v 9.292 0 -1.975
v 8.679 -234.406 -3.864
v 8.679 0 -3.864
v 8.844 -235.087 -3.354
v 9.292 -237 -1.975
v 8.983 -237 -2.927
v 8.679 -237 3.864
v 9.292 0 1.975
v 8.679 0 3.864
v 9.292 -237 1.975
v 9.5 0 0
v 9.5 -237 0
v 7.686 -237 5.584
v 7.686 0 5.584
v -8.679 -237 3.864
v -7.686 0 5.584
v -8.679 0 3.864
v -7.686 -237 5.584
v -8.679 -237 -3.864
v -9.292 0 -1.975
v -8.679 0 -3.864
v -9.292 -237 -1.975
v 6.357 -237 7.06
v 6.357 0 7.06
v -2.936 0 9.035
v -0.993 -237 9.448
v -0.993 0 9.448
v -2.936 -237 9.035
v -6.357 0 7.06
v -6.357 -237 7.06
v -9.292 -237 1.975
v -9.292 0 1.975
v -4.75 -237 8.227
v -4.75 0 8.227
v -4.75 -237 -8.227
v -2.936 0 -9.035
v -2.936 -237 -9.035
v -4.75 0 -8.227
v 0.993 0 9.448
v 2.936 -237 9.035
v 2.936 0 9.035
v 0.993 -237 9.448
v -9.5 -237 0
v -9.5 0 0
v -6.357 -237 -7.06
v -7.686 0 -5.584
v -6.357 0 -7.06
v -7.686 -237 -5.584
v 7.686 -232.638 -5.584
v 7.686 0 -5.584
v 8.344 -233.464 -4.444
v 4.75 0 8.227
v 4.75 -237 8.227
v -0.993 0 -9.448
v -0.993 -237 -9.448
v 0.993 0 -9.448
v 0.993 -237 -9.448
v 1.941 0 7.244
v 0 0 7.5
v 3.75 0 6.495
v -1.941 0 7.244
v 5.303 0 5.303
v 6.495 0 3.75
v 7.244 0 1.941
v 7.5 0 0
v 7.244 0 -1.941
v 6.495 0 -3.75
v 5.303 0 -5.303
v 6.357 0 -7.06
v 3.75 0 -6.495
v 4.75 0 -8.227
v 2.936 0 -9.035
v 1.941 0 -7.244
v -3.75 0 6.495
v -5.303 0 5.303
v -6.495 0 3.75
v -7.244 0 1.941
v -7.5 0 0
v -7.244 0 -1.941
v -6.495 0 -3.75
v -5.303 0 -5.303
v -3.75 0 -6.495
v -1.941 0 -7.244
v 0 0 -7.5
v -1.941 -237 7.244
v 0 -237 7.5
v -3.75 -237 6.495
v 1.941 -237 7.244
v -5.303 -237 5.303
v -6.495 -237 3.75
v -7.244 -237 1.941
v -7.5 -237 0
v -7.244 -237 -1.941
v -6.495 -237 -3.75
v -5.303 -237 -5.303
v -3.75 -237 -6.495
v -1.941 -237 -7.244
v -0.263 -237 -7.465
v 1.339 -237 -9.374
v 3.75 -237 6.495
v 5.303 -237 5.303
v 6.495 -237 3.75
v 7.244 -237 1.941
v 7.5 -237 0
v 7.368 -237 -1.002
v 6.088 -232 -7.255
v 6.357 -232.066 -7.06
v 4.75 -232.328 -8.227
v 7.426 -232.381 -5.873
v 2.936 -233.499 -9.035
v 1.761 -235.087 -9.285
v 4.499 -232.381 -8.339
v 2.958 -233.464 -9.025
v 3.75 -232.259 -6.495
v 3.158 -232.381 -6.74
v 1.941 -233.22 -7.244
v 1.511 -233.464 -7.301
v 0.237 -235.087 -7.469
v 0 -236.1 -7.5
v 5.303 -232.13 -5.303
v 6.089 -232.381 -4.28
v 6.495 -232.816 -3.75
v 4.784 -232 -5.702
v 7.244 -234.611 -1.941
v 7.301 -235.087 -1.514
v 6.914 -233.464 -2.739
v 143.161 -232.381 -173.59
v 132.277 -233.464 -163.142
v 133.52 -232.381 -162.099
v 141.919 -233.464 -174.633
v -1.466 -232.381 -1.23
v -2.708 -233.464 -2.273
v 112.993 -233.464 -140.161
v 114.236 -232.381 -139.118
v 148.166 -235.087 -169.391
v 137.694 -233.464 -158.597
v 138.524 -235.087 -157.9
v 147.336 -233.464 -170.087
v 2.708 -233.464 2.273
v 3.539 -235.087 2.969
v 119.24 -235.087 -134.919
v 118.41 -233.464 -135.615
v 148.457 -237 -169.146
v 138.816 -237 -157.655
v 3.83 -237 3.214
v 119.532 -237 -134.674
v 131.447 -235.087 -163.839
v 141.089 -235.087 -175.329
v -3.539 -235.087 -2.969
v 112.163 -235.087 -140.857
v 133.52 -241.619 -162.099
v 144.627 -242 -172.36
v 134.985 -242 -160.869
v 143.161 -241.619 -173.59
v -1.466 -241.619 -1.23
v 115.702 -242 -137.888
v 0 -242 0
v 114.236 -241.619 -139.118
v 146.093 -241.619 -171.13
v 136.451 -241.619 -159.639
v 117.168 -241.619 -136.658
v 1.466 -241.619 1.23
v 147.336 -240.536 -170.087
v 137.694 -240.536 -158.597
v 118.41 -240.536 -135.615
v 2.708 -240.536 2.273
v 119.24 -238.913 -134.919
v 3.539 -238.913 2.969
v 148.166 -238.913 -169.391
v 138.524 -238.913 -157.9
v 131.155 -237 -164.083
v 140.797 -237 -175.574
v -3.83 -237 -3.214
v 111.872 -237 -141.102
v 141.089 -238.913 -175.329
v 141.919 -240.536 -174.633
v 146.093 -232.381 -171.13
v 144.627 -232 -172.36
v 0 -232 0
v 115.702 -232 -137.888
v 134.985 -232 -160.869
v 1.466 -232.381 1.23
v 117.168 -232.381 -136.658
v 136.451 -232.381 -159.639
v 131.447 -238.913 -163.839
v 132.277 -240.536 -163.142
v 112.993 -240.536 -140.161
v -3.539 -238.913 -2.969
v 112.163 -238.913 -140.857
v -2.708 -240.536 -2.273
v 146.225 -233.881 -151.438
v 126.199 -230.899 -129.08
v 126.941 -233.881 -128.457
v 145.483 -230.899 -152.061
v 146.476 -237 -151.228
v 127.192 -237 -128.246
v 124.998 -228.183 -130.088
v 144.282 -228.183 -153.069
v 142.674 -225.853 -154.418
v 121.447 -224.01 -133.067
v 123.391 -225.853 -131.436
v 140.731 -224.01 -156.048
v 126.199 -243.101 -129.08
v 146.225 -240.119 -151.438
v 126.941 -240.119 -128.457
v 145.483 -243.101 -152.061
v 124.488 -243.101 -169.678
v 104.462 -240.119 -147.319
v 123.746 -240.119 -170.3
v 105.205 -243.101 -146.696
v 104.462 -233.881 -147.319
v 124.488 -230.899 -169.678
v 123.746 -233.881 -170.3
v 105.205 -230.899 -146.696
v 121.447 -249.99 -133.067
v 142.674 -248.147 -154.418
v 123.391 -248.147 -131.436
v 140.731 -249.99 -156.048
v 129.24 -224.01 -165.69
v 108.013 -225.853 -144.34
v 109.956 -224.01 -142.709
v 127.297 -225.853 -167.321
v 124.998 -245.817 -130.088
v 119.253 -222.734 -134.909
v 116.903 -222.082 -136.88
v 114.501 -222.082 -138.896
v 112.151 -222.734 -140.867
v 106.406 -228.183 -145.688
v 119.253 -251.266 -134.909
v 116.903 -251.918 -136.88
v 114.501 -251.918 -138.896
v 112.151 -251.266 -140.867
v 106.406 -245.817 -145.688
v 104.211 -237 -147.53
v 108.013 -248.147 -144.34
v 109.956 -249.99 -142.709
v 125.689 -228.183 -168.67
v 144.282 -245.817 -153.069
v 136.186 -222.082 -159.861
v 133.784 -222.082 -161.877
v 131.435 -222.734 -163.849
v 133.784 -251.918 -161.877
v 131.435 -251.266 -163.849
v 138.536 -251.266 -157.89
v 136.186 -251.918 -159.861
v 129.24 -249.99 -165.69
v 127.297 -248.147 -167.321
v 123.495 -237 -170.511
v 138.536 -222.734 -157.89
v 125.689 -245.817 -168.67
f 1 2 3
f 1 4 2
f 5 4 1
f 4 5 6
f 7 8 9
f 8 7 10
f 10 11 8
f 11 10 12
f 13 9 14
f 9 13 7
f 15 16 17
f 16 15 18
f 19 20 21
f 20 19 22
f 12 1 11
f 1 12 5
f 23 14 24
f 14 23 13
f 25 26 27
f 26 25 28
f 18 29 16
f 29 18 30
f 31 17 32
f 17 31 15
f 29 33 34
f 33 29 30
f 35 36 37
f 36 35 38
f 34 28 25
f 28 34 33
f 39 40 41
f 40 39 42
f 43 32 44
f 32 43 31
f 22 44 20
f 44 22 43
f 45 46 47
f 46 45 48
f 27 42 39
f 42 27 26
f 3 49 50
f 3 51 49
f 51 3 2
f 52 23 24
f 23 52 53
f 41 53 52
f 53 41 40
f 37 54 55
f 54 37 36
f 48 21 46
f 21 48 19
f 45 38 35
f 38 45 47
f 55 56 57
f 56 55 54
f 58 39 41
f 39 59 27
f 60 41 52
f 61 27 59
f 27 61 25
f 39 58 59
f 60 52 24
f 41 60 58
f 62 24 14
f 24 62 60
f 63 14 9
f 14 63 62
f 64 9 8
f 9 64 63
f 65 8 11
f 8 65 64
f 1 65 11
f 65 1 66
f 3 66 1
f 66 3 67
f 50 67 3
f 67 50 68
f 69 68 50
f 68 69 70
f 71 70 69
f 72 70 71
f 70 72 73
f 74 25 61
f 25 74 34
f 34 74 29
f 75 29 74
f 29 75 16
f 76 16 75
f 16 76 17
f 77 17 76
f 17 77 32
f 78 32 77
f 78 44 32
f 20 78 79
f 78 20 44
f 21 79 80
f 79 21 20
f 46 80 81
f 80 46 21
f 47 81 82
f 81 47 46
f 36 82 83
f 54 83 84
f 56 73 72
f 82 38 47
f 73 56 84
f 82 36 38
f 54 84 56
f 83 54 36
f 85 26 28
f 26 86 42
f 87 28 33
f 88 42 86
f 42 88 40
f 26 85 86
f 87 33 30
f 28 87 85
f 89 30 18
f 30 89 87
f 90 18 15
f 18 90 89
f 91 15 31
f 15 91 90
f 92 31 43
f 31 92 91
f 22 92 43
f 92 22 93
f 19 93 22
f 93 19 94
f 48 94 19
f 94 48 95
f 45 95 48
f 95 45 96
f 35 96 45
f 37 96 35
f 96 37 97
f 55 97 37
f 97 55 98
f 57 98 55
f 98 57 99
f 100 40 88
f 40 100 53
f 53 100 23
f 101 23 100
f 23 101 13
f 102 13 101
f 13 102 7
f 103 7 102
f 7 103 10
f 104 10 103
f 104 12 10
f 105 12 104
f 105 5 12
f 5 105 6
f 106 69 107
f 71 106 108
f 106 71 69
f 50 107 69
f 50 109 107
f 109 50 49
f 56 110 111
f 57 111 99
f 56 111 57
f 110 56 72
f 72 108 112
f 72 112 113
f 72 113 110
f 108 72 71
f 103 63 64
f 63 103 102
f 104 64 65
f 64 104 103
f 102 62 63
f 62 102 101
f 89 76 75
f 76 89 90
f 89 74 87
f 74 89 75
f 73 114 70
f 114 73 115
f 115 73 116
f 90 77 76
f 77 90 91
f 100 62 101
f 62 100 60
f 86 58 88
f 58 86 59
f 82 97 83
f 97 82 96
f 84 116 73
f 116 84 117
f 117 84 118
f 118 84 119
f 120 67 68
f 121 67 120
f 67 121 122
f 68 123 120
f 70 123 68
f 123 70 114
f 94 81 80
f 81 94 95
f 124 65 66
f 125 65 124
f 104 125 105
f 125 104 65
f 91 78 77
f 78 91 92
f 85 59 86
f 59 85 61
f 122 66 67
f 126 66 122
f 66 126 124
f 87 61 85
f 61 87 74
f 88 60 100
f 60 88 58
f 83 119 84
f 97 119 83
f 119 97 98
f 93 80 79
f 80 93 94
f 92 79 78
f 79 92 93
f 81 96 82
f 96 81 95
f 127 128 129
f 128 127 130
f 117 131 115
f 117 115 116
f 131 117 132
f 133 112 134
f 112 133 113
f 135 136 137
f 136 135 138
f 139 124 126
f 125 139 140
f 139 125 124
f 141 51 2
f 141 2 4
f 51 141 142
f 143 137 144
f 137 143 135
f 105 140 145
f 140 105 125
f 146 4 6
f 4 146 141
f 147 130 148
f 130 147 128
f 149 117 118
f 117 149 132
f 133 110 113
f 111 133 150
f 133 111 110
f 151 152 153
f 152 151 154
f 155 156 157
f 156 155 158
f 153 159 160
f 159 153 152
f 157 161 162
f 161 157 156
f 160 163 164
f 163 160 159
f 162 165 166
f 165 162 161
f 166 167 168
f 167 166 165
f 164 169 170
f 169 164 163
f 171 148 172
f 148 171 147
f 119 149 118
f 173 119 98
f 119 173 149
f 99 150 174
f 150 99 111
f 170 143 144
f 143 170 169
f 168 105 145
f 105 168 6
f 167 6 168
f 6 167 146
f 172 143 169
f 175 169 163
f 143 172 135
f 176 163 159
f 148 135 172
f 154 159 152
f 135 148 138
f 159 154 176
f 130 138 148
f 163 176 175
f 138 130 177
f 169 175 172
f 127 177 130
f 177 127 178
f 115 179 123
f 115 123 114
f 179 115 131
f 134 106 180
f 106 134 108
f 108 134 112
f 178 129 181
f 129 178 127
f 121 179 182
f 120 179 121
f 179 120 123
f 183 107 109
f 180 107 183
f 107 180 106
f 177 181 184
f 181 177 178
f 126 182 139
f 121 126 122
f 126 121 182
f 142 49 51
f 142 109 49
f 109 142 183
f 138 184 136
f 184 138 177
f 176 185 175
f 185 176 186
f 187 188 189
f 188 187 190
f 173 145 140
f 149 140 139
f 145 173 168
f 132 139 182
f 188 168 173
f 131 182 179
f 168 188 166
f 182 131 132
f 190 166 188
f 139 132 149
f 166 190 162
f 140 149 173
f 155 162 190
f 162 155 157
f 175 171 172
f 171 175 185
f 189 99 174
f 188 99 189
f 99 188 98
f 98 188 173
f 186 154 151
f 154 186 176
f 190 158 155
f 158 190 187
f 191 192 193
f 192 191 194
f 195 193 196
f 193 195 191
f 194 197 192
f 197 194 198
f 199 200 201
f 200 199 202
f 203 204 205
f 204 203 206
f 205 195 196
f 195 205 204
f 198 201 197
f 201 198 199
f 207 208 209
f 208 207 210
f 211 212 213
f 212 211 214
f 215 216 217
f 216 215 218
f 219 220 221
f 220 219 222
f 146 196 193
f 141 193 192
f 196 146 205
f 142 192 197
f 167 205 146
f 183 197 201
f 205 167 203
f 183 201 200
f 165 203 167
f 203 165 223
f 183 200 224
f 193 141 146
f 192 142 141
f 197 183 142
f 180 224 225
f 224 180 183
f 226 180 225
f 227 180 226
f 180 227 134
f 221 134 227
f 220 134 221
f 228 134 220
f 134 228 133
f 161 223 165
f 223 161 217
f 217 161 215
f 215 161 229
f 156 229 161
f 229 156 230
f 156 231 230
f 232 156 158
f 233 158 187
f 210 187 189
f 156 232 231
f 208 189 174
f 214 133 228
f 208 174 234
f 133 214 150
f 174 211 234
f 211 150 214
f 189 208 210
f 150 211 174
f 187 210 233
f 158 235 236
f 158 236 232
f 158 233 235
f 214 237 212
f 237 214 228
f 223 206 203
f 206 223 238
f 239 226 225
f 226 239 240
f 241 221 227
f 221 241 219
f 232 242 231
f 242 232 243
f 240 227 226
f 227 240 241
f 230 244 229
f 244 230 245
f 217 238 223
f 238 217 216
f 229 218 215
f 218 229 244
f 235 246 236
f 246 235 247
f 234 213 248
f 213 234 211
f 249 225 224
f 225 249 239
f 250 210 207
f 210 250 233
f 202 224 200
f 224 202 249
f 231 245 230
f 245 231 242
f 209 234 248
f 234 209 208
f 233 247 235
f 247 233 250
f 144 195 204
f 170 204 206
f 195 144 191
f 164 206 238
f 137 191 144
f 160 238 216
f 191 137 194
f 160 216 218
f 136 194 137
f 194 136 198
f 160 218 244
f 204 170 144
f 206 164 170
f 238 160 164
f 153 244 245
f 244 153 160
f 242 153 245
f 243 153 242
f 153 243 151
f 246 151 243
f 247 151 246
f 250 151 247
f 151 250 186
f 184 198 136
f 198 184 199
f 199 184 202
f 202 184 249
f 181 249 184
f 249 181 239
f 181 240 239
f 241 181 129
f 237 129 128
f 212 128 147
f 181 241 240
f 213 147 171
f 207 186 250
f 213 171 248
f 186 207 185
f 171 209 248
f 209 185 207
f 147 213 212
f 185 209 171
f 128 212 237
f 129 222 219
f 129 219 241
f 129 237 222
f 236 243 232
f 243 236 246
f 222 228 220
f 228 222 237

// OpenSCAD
    // ==================== PARÁMETROS ====================
L_pendulo = 225;          
L_peso = 30;              
r_peso = 15;
r_varilla = 5;

armlength = 237;
pared = 2;
diam_tubo_arm = 19;
radio_ext = diam_tubo_arm / 2;
radio_int = radio_ext - pared;

// ==================== MÓDULOS ====================


// Brazo: se extiende a lo largo del eje Y positivo
module arm(){
    rotate([90, 0, 0]) {
        difference(){
            cylinder(h=armlength, r=radio_ext, center=false);
            cylinder(h=armlength + 2, r=radio_int, center=false);
        }
    }
}



// Péndulo: su PIVOTE está en el origen (parte superior de la varilla)
module pendulo(angulo){
    rotate([0, -angulo, 0]) { // Gira alrededor del eje Y (eje del brazo)
        // Varilla (baja desde 0 hasta -225)
        translate([0, 0, -L_pendulo])
            cylinder(h=L_pendulo, r=r_varilla, center=false);
        // Peso (situado a 15mm del extremo)
        translate([0, 0, -210])
            cylinder(h=L_peso, r=r_peso, center=false);
    }
}



// Sistema completo del péndulo de Furuta
module furuta(theta, alpha){
    rotate([0, 0, theta]) {        // 1. Rotación del brazo en el plano horizontal
        color("orangered")
        arm();                      // Dibuja el brazo desde el origen
        
        color("gray")
        translate([0,-armlength, 0]) { // 2. Traslada al extremo del brazo
            pendulo(alpha);          // 3. Dibuja el péndulo con su inclinación
        }
    }
}

// ==================== EJEMPLO ====================
// Aproximación de Taylor de orden n al coseno. Cambia n y observa.
n = 6;   // prueba con 2, 4, 6, 8...
x = 360 * $t * 2;   // ωt en grados
function taylor_cos_deg(x, n, k = 0) =
    k > n ? 0 :
        ((k % 2 == 0) ? 1 : -1) * pow(x * 3.14159/180, 2*k) / 
        (  (k==0)?1 : (k==1)?2 : (k==2)?24 : (k==3)?720 : 
           (k==4)?40320 : (k==5)?3628800 : 479001600 )
        + taylor_cos_deg(x, n, k + 1);

alpha = 40 * taylor_cos_deg(x, n);
furuta(0, alpha);
